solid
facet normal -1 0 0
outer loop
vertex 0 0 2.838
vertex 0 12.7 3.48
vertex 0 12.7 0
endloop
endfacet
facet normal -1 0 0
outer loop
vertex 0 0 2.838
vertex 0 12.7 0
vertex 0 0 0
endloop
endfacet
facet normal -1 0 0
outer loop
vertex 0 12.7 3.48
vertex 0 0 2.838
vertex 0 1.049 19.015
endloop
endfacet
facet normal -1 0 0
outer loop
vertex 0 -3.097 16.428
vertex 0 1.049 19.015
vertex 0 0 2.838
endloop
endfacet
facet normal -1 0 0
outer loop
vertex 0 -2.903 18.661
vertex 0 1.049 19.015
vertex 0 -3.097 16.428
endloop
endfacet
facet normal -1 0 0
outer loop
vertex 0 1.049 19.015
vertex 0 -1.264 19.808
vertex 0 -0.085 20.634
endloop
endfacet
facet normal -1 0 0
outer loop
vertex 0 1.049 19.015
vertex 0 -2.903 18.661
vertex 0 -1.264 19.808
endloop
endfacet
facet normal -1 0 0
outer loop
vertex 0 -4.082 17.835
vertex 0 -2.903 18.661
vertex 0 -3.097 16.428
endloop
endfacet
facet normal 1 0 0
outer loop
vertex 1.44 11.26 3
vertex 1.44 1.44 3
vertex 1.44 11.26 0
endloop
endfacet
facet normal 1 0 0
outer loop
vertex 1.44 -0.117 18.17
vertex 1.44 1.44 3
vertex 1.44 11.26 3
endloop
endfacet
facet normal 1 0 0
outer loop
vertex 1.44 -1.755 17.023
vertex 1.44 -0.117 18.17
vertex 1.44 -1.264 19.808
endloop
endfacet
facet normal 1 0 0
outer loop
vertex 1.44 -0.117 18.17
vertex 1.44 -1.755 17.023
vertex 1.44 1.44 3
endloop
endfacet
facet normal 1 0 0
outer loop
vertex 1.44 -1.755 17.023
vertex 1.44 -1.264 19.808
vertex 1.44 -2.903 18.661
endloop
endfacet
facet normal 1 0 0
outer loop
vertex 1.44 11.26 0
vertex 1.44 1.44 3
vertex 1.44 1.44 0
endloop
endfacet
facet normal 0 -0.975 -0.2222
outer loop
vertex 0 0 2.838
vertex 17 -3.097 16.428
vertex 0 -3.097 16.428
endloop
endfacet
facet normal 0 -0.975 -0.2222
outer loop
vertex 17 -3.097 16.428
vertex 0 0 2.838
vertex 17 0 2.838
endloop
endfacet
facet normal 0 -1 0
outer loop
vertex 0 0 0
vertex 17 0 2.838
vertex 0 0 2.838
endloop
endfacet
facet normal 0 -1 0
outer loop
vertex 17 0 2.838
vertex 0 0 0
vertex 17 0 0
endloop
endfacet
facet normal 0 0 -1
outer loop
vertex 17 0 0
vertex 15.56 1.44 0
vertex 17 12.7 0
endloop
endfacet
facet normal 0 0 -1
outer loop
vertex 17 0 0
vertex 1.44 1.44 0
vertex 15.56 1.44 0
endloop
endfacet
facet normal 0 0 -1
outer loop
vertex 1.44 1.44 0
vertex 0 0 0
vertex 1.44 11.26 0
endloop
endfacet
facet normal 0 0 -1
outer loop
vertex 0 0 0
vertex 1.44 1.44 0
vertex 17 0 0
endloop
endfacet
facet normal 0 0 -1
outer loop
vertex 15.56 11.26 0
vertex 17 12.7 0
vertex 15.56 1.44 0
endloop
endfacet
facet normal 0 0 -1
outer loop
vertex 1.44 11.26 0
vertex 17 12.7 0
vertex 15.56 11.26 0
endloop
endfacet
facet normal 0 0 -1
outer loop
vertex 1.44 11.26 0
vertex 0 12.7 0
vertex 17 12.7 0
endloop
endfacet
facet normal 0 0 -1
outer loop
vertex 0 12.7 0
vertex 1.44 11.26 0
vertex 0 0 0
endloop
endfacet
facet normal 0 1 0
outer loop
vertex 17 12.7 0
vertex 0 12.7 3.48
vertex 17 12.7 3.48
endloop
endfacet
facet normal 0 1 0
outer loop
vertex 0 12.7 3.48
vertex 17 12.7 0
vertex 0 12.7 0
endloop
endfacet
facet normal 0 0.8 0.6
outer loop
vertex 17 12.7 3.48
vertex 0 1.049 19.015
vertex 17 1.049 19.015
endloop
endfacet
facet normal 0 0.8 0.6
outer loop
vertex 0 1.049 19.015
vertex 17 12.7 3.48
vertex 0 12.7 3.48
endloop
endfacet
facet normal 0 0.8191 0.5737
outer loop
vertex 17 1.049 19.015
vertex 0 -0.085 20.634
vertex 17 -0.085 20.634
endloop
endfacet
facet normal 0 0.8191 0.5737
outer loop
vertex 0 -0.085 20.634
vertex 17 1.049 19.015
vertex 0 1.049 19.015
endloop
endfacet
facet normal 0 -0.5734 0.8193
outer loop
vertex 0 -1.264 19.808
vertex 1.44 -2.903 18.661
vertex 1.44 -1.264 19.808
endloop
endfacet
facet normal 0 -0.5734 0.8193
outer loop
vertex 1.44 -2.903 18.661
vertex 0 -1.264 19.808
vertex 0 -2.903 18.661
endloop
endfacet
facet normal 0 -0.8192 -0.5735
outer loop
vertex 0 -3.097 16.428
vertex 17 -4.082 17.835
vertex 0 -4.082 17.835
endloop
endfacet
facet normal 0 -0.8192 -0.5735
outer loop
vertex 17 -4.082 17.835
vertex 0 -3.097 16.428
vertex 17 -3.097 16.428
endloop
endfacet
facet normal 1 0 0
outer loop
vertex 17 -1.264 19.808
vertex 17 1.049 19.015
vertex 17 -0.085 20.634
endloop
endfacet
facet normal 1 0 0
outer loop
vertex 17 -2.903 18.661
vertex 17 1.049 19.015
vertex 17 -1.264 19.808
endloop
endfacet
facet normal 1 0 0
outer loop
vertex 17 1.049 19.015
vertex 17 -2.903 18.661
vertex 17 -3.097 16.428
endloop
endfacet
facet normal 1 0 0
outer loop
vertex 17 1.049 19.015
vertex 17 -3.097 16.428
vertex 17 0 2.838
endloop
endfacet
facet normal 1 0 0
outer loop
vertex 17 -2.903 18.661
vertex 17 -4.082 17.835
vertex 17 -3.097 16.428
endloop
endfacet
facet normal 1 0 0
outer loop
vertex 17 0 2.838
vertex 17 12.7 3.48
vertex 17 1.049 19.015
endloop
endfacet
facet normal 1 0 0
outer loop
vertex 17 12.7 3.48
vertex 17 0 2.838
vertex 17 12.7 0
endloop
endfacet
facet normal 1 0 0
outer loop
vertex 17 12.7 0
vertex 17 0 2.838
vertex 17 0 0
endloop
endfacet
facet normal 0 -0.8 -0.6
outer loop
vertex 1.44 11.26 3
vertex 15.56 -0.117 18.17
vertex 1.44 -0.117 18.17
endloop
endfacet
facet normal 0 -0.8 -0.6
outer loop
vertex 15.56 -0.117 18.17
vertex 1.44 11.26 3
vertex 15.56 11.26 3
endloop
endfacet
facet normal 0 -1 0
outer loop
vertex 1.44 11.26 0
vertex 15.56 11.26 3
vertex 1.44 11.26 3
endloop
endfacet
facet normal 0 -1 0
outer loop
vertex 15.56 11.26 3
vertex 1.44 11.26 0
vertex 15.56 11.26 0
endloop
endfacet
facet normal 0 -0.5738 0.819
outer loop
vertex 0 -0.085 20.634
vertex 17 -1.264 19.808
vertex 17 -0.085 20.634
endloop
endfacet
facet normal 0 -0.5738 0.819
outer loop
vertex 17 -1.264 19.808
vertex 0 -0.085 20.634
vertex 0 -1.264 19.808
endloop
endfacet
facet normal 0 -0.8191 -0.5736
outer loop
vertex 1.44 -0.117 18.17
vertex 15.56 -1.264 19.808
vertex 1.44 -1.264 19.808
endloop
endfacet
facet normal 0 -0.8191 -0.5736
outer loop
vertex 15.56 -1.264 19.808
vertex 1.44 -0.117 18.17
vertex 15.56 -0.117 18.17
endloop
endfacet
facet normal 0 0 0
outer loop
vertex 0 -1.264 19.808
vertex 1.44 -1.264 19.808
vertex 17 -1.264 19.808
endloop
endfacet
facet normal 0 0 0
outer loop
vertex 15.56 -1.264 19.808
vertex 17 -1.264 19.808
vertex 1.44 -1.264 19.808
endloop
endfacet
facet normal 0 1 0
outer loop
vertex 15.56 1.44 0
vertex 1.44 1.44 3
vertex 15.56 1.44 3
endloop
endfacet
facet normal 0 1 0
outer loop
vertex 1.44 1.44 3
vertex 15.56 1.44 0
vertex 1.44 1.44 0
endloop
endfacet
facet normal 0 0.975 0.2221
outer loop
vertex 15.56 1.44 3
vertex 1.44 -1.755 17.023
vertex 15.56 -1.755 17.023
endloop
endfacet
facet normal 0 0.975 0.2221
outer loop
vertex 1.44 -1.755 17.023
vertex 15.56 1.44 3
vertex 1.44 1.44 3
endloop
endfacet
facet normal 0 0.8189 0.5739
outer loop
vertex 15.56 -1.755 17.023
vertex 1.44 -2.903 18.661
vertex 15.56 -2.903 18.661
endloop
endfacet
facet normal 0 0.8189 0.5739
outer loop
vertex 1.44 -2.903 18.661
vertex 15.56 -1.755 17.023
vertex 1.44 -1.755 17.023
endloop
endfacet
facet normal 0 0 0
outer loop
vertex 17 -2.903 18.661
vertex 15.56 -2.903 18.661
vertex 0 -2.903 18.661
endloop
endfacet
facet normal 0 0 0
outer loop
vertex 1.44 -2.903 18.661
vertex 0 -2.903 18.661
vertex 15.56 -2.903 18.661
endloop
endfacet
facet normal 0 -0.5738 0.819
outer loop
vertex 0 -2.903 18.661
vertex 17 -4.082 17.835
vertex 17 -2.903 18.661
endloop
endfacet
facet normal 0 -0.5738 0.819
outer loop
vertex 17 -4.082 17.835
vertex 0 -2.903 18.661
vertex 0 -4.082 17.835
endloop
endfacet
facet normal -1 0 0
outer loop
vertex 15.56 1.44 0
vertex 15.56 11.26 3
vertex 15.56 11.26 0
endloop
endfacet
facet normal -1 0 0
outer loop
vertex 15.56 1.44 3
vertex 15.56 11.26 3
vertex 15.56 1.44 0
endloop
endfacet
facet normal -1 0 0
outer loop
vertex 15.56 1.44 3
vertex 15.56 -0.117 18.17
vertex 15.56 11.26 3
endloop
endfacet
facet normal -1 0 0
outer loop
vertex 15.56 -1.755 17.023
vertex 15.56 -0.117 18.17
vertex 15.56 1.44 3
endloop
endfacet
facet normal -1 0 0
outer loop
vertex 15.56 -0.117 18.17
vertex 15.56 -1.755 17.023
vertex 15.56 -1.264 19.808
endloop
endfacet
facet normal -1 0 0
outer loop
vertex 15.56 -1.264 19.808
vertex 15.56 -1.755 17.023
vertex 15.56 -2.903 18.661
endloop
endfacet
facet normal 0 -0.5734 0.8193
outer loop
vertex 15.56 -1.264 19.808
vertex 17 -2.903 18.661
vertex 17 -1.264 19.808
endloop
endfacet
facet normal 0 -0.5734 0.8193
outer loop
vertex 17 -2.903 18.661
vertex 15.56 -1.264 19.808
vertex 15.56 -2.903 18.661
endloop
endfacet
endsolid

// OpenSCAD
/*
translate([0,-140,0])
import("wanhao_duplicator_6_fan_duct_cooling_5015-B.STL");

module h() {
    hull() {
    circle(d = 3.4);
    translate([3.5,0,0])
    circle(d = 3.4);
    }
}

//color("green")
translate([61,65.555,19.9])
linear_extrude(4, $fa = 0.1, $fs = 0.1)
difference() {
offset(2.43)
h();
h();
}


//color("green")
translate([93,65.555,19.9])
linear_extrude(4, $fa = 0.1, $fs = 0.1)
difference() {
offset(2.43)
h();
h();
}*/

$fa = 0.2;
$fs = 0.2;

heatsink_width = 46;
heatsink_length = 68;
heatsink_thickness = 8;
heatsink_nozzle_d = 7.9;
heater_height = 38.7;

module heater_block() {

    heatbreak_height = 19.7;

    translate([0,0,heater_height-heatbreak_height])
    cylinder(d = 7.8, h = heatbreak_height);
    
    translate([-19/2+2+9/2,33/2,12/2+7])
    rotate([90,0,0])
    linear_extrude(33)
    intersection() {
        square([19,12],center=true);
        circle(d = 19);
    }
    
    rotate([0,0,30])
    translate([0,0,3])
    cylinder(d = 9 * 2 / sqrt(3), h = 4, $fn = 6);
    
    cylinder(d1 = 0.6, d2 = 9, h = 3);
}


module heat_sink() {
    
    linear_extrude(heatsink_thickness)
    difference() {
        square([heatsink_length, heatsink_width]);
        
        translate([heatsink_length - 3, heatsink_width - 6])
        circle(d = 3.2);
        
        translate([heatsink_length - 3, heatsink_width - 6 - 32])
        circle(d = 3.2);
        
        translate([heatsink_length - 3 - 32, heatsink_width - 6])
        circle(d = 3.2);
        
        translate([2 + heatsink_nozzle_d/2,3 + heatsink_nozzle_d/2])
        circle(d = heatsink_nozzle_d);
        
        
        translate([4.25,heatsink_width-10])
        circle(d = 3.2);
        
        translate([4.25,heatsink_width-10-20])
        circle(d = 3.2);
        
        translate([4.25+17,heatsink_width-10])
        circle(d = 3.2);
        
        translate([4.25+17,heatsink_width-10-20])
        circle(d = 3.2);
    }

}

fan_hole_width = 12.7;
fan_hole_height = 17;

fan_out_pos = [25,10,6];

duct_thickness = 0.48*3;
duct_fanout_width = fan_hole_width;
duct_fanout_length = 3;
duct_nose_length = 2;
duct_width = 2;
duct_distance = 10;
duct_height = fan_hole_height;
duct_angle = 55;
//duct_height = 12.7;

duct_pos_z = fan_out_pos[2] + 1;


function rot(p, a) = [cos(a)*p[0]+sin(a)*p[1],cos(a)*p[1]-sin(a)*p[0]];

echo(rot([0,10], 55));

module duct_shape_inner(t = 0) {
    polygon([
        rot([0,duct_distance-t], duct_angle),
        rot([0,duct_distance+duct_nose_length], duct_angle),
        [ fan_out_pos[0], duct_pos_z + duct_fanout_width - duct_thickness ],
        [ fan_out_pos[0] + duct_fanout_length + t, duct_pos_z + duct_fanout_width - duct_thickness ],
        [ fan_out_pos[0] + duct_fanout_length + t, duct_pos_z + duct_thickness ],
        [ fan_out_pos[0], duct_pos_z + duct_thickness ],
        rot([duct_width,duct_distance+duct_nose_length], duct_angle),
        rot([duct_width,duct_distance-t], duct_angle)
    ]);
}

module duct_shape() {
   difference() {
        offset(delta=duct_thickness)
            duct_shape_inner();
    
        rotate(-duct_angle)
        translate([-duct_thickness-1, duct_distance-duct_thickness-1])
        square([duct_width + duct_thickness*2+2, duct_thickness+1]);
    
        translate([fan_out_pos[0] + duct_fanout_length, duct_pos_z-duct_thickness])
        square([duct_thickness+1, duct_fanout_width + duct_thickness*2]);
        
   }
}

module duct() {
    
    linear_extrude(duct_thickness)
    duct_shape();

    linear_extrude(duct_height)
    difference() {
        duct_shape();
        duct_shape_inner(duct_thickness);
    }

    translate([0,0,duct_height-duct_thickness])
    linear_extrude(duct_thickness)
    duct_shape();

}

rotate([0,90,0])
translate([-fan_out_pos[0]-duct_fanout_length, -duct_pos_z,0])
duct();

/*

*translate([0,fan_hole_height/2,0])
rotate([90,0,0])
duct();

*heater_block();

*translate([-2 - heatsink_nozzle_d/2,-3 - heatsink_nozzle_d/2,heater_height-heatsink_thickness-5])
heat_sink();

*#translate(fan_out_pos)
rotate([0,0,-90])
translate([-44.262,5.8,107])
import("fan.stl");*/
